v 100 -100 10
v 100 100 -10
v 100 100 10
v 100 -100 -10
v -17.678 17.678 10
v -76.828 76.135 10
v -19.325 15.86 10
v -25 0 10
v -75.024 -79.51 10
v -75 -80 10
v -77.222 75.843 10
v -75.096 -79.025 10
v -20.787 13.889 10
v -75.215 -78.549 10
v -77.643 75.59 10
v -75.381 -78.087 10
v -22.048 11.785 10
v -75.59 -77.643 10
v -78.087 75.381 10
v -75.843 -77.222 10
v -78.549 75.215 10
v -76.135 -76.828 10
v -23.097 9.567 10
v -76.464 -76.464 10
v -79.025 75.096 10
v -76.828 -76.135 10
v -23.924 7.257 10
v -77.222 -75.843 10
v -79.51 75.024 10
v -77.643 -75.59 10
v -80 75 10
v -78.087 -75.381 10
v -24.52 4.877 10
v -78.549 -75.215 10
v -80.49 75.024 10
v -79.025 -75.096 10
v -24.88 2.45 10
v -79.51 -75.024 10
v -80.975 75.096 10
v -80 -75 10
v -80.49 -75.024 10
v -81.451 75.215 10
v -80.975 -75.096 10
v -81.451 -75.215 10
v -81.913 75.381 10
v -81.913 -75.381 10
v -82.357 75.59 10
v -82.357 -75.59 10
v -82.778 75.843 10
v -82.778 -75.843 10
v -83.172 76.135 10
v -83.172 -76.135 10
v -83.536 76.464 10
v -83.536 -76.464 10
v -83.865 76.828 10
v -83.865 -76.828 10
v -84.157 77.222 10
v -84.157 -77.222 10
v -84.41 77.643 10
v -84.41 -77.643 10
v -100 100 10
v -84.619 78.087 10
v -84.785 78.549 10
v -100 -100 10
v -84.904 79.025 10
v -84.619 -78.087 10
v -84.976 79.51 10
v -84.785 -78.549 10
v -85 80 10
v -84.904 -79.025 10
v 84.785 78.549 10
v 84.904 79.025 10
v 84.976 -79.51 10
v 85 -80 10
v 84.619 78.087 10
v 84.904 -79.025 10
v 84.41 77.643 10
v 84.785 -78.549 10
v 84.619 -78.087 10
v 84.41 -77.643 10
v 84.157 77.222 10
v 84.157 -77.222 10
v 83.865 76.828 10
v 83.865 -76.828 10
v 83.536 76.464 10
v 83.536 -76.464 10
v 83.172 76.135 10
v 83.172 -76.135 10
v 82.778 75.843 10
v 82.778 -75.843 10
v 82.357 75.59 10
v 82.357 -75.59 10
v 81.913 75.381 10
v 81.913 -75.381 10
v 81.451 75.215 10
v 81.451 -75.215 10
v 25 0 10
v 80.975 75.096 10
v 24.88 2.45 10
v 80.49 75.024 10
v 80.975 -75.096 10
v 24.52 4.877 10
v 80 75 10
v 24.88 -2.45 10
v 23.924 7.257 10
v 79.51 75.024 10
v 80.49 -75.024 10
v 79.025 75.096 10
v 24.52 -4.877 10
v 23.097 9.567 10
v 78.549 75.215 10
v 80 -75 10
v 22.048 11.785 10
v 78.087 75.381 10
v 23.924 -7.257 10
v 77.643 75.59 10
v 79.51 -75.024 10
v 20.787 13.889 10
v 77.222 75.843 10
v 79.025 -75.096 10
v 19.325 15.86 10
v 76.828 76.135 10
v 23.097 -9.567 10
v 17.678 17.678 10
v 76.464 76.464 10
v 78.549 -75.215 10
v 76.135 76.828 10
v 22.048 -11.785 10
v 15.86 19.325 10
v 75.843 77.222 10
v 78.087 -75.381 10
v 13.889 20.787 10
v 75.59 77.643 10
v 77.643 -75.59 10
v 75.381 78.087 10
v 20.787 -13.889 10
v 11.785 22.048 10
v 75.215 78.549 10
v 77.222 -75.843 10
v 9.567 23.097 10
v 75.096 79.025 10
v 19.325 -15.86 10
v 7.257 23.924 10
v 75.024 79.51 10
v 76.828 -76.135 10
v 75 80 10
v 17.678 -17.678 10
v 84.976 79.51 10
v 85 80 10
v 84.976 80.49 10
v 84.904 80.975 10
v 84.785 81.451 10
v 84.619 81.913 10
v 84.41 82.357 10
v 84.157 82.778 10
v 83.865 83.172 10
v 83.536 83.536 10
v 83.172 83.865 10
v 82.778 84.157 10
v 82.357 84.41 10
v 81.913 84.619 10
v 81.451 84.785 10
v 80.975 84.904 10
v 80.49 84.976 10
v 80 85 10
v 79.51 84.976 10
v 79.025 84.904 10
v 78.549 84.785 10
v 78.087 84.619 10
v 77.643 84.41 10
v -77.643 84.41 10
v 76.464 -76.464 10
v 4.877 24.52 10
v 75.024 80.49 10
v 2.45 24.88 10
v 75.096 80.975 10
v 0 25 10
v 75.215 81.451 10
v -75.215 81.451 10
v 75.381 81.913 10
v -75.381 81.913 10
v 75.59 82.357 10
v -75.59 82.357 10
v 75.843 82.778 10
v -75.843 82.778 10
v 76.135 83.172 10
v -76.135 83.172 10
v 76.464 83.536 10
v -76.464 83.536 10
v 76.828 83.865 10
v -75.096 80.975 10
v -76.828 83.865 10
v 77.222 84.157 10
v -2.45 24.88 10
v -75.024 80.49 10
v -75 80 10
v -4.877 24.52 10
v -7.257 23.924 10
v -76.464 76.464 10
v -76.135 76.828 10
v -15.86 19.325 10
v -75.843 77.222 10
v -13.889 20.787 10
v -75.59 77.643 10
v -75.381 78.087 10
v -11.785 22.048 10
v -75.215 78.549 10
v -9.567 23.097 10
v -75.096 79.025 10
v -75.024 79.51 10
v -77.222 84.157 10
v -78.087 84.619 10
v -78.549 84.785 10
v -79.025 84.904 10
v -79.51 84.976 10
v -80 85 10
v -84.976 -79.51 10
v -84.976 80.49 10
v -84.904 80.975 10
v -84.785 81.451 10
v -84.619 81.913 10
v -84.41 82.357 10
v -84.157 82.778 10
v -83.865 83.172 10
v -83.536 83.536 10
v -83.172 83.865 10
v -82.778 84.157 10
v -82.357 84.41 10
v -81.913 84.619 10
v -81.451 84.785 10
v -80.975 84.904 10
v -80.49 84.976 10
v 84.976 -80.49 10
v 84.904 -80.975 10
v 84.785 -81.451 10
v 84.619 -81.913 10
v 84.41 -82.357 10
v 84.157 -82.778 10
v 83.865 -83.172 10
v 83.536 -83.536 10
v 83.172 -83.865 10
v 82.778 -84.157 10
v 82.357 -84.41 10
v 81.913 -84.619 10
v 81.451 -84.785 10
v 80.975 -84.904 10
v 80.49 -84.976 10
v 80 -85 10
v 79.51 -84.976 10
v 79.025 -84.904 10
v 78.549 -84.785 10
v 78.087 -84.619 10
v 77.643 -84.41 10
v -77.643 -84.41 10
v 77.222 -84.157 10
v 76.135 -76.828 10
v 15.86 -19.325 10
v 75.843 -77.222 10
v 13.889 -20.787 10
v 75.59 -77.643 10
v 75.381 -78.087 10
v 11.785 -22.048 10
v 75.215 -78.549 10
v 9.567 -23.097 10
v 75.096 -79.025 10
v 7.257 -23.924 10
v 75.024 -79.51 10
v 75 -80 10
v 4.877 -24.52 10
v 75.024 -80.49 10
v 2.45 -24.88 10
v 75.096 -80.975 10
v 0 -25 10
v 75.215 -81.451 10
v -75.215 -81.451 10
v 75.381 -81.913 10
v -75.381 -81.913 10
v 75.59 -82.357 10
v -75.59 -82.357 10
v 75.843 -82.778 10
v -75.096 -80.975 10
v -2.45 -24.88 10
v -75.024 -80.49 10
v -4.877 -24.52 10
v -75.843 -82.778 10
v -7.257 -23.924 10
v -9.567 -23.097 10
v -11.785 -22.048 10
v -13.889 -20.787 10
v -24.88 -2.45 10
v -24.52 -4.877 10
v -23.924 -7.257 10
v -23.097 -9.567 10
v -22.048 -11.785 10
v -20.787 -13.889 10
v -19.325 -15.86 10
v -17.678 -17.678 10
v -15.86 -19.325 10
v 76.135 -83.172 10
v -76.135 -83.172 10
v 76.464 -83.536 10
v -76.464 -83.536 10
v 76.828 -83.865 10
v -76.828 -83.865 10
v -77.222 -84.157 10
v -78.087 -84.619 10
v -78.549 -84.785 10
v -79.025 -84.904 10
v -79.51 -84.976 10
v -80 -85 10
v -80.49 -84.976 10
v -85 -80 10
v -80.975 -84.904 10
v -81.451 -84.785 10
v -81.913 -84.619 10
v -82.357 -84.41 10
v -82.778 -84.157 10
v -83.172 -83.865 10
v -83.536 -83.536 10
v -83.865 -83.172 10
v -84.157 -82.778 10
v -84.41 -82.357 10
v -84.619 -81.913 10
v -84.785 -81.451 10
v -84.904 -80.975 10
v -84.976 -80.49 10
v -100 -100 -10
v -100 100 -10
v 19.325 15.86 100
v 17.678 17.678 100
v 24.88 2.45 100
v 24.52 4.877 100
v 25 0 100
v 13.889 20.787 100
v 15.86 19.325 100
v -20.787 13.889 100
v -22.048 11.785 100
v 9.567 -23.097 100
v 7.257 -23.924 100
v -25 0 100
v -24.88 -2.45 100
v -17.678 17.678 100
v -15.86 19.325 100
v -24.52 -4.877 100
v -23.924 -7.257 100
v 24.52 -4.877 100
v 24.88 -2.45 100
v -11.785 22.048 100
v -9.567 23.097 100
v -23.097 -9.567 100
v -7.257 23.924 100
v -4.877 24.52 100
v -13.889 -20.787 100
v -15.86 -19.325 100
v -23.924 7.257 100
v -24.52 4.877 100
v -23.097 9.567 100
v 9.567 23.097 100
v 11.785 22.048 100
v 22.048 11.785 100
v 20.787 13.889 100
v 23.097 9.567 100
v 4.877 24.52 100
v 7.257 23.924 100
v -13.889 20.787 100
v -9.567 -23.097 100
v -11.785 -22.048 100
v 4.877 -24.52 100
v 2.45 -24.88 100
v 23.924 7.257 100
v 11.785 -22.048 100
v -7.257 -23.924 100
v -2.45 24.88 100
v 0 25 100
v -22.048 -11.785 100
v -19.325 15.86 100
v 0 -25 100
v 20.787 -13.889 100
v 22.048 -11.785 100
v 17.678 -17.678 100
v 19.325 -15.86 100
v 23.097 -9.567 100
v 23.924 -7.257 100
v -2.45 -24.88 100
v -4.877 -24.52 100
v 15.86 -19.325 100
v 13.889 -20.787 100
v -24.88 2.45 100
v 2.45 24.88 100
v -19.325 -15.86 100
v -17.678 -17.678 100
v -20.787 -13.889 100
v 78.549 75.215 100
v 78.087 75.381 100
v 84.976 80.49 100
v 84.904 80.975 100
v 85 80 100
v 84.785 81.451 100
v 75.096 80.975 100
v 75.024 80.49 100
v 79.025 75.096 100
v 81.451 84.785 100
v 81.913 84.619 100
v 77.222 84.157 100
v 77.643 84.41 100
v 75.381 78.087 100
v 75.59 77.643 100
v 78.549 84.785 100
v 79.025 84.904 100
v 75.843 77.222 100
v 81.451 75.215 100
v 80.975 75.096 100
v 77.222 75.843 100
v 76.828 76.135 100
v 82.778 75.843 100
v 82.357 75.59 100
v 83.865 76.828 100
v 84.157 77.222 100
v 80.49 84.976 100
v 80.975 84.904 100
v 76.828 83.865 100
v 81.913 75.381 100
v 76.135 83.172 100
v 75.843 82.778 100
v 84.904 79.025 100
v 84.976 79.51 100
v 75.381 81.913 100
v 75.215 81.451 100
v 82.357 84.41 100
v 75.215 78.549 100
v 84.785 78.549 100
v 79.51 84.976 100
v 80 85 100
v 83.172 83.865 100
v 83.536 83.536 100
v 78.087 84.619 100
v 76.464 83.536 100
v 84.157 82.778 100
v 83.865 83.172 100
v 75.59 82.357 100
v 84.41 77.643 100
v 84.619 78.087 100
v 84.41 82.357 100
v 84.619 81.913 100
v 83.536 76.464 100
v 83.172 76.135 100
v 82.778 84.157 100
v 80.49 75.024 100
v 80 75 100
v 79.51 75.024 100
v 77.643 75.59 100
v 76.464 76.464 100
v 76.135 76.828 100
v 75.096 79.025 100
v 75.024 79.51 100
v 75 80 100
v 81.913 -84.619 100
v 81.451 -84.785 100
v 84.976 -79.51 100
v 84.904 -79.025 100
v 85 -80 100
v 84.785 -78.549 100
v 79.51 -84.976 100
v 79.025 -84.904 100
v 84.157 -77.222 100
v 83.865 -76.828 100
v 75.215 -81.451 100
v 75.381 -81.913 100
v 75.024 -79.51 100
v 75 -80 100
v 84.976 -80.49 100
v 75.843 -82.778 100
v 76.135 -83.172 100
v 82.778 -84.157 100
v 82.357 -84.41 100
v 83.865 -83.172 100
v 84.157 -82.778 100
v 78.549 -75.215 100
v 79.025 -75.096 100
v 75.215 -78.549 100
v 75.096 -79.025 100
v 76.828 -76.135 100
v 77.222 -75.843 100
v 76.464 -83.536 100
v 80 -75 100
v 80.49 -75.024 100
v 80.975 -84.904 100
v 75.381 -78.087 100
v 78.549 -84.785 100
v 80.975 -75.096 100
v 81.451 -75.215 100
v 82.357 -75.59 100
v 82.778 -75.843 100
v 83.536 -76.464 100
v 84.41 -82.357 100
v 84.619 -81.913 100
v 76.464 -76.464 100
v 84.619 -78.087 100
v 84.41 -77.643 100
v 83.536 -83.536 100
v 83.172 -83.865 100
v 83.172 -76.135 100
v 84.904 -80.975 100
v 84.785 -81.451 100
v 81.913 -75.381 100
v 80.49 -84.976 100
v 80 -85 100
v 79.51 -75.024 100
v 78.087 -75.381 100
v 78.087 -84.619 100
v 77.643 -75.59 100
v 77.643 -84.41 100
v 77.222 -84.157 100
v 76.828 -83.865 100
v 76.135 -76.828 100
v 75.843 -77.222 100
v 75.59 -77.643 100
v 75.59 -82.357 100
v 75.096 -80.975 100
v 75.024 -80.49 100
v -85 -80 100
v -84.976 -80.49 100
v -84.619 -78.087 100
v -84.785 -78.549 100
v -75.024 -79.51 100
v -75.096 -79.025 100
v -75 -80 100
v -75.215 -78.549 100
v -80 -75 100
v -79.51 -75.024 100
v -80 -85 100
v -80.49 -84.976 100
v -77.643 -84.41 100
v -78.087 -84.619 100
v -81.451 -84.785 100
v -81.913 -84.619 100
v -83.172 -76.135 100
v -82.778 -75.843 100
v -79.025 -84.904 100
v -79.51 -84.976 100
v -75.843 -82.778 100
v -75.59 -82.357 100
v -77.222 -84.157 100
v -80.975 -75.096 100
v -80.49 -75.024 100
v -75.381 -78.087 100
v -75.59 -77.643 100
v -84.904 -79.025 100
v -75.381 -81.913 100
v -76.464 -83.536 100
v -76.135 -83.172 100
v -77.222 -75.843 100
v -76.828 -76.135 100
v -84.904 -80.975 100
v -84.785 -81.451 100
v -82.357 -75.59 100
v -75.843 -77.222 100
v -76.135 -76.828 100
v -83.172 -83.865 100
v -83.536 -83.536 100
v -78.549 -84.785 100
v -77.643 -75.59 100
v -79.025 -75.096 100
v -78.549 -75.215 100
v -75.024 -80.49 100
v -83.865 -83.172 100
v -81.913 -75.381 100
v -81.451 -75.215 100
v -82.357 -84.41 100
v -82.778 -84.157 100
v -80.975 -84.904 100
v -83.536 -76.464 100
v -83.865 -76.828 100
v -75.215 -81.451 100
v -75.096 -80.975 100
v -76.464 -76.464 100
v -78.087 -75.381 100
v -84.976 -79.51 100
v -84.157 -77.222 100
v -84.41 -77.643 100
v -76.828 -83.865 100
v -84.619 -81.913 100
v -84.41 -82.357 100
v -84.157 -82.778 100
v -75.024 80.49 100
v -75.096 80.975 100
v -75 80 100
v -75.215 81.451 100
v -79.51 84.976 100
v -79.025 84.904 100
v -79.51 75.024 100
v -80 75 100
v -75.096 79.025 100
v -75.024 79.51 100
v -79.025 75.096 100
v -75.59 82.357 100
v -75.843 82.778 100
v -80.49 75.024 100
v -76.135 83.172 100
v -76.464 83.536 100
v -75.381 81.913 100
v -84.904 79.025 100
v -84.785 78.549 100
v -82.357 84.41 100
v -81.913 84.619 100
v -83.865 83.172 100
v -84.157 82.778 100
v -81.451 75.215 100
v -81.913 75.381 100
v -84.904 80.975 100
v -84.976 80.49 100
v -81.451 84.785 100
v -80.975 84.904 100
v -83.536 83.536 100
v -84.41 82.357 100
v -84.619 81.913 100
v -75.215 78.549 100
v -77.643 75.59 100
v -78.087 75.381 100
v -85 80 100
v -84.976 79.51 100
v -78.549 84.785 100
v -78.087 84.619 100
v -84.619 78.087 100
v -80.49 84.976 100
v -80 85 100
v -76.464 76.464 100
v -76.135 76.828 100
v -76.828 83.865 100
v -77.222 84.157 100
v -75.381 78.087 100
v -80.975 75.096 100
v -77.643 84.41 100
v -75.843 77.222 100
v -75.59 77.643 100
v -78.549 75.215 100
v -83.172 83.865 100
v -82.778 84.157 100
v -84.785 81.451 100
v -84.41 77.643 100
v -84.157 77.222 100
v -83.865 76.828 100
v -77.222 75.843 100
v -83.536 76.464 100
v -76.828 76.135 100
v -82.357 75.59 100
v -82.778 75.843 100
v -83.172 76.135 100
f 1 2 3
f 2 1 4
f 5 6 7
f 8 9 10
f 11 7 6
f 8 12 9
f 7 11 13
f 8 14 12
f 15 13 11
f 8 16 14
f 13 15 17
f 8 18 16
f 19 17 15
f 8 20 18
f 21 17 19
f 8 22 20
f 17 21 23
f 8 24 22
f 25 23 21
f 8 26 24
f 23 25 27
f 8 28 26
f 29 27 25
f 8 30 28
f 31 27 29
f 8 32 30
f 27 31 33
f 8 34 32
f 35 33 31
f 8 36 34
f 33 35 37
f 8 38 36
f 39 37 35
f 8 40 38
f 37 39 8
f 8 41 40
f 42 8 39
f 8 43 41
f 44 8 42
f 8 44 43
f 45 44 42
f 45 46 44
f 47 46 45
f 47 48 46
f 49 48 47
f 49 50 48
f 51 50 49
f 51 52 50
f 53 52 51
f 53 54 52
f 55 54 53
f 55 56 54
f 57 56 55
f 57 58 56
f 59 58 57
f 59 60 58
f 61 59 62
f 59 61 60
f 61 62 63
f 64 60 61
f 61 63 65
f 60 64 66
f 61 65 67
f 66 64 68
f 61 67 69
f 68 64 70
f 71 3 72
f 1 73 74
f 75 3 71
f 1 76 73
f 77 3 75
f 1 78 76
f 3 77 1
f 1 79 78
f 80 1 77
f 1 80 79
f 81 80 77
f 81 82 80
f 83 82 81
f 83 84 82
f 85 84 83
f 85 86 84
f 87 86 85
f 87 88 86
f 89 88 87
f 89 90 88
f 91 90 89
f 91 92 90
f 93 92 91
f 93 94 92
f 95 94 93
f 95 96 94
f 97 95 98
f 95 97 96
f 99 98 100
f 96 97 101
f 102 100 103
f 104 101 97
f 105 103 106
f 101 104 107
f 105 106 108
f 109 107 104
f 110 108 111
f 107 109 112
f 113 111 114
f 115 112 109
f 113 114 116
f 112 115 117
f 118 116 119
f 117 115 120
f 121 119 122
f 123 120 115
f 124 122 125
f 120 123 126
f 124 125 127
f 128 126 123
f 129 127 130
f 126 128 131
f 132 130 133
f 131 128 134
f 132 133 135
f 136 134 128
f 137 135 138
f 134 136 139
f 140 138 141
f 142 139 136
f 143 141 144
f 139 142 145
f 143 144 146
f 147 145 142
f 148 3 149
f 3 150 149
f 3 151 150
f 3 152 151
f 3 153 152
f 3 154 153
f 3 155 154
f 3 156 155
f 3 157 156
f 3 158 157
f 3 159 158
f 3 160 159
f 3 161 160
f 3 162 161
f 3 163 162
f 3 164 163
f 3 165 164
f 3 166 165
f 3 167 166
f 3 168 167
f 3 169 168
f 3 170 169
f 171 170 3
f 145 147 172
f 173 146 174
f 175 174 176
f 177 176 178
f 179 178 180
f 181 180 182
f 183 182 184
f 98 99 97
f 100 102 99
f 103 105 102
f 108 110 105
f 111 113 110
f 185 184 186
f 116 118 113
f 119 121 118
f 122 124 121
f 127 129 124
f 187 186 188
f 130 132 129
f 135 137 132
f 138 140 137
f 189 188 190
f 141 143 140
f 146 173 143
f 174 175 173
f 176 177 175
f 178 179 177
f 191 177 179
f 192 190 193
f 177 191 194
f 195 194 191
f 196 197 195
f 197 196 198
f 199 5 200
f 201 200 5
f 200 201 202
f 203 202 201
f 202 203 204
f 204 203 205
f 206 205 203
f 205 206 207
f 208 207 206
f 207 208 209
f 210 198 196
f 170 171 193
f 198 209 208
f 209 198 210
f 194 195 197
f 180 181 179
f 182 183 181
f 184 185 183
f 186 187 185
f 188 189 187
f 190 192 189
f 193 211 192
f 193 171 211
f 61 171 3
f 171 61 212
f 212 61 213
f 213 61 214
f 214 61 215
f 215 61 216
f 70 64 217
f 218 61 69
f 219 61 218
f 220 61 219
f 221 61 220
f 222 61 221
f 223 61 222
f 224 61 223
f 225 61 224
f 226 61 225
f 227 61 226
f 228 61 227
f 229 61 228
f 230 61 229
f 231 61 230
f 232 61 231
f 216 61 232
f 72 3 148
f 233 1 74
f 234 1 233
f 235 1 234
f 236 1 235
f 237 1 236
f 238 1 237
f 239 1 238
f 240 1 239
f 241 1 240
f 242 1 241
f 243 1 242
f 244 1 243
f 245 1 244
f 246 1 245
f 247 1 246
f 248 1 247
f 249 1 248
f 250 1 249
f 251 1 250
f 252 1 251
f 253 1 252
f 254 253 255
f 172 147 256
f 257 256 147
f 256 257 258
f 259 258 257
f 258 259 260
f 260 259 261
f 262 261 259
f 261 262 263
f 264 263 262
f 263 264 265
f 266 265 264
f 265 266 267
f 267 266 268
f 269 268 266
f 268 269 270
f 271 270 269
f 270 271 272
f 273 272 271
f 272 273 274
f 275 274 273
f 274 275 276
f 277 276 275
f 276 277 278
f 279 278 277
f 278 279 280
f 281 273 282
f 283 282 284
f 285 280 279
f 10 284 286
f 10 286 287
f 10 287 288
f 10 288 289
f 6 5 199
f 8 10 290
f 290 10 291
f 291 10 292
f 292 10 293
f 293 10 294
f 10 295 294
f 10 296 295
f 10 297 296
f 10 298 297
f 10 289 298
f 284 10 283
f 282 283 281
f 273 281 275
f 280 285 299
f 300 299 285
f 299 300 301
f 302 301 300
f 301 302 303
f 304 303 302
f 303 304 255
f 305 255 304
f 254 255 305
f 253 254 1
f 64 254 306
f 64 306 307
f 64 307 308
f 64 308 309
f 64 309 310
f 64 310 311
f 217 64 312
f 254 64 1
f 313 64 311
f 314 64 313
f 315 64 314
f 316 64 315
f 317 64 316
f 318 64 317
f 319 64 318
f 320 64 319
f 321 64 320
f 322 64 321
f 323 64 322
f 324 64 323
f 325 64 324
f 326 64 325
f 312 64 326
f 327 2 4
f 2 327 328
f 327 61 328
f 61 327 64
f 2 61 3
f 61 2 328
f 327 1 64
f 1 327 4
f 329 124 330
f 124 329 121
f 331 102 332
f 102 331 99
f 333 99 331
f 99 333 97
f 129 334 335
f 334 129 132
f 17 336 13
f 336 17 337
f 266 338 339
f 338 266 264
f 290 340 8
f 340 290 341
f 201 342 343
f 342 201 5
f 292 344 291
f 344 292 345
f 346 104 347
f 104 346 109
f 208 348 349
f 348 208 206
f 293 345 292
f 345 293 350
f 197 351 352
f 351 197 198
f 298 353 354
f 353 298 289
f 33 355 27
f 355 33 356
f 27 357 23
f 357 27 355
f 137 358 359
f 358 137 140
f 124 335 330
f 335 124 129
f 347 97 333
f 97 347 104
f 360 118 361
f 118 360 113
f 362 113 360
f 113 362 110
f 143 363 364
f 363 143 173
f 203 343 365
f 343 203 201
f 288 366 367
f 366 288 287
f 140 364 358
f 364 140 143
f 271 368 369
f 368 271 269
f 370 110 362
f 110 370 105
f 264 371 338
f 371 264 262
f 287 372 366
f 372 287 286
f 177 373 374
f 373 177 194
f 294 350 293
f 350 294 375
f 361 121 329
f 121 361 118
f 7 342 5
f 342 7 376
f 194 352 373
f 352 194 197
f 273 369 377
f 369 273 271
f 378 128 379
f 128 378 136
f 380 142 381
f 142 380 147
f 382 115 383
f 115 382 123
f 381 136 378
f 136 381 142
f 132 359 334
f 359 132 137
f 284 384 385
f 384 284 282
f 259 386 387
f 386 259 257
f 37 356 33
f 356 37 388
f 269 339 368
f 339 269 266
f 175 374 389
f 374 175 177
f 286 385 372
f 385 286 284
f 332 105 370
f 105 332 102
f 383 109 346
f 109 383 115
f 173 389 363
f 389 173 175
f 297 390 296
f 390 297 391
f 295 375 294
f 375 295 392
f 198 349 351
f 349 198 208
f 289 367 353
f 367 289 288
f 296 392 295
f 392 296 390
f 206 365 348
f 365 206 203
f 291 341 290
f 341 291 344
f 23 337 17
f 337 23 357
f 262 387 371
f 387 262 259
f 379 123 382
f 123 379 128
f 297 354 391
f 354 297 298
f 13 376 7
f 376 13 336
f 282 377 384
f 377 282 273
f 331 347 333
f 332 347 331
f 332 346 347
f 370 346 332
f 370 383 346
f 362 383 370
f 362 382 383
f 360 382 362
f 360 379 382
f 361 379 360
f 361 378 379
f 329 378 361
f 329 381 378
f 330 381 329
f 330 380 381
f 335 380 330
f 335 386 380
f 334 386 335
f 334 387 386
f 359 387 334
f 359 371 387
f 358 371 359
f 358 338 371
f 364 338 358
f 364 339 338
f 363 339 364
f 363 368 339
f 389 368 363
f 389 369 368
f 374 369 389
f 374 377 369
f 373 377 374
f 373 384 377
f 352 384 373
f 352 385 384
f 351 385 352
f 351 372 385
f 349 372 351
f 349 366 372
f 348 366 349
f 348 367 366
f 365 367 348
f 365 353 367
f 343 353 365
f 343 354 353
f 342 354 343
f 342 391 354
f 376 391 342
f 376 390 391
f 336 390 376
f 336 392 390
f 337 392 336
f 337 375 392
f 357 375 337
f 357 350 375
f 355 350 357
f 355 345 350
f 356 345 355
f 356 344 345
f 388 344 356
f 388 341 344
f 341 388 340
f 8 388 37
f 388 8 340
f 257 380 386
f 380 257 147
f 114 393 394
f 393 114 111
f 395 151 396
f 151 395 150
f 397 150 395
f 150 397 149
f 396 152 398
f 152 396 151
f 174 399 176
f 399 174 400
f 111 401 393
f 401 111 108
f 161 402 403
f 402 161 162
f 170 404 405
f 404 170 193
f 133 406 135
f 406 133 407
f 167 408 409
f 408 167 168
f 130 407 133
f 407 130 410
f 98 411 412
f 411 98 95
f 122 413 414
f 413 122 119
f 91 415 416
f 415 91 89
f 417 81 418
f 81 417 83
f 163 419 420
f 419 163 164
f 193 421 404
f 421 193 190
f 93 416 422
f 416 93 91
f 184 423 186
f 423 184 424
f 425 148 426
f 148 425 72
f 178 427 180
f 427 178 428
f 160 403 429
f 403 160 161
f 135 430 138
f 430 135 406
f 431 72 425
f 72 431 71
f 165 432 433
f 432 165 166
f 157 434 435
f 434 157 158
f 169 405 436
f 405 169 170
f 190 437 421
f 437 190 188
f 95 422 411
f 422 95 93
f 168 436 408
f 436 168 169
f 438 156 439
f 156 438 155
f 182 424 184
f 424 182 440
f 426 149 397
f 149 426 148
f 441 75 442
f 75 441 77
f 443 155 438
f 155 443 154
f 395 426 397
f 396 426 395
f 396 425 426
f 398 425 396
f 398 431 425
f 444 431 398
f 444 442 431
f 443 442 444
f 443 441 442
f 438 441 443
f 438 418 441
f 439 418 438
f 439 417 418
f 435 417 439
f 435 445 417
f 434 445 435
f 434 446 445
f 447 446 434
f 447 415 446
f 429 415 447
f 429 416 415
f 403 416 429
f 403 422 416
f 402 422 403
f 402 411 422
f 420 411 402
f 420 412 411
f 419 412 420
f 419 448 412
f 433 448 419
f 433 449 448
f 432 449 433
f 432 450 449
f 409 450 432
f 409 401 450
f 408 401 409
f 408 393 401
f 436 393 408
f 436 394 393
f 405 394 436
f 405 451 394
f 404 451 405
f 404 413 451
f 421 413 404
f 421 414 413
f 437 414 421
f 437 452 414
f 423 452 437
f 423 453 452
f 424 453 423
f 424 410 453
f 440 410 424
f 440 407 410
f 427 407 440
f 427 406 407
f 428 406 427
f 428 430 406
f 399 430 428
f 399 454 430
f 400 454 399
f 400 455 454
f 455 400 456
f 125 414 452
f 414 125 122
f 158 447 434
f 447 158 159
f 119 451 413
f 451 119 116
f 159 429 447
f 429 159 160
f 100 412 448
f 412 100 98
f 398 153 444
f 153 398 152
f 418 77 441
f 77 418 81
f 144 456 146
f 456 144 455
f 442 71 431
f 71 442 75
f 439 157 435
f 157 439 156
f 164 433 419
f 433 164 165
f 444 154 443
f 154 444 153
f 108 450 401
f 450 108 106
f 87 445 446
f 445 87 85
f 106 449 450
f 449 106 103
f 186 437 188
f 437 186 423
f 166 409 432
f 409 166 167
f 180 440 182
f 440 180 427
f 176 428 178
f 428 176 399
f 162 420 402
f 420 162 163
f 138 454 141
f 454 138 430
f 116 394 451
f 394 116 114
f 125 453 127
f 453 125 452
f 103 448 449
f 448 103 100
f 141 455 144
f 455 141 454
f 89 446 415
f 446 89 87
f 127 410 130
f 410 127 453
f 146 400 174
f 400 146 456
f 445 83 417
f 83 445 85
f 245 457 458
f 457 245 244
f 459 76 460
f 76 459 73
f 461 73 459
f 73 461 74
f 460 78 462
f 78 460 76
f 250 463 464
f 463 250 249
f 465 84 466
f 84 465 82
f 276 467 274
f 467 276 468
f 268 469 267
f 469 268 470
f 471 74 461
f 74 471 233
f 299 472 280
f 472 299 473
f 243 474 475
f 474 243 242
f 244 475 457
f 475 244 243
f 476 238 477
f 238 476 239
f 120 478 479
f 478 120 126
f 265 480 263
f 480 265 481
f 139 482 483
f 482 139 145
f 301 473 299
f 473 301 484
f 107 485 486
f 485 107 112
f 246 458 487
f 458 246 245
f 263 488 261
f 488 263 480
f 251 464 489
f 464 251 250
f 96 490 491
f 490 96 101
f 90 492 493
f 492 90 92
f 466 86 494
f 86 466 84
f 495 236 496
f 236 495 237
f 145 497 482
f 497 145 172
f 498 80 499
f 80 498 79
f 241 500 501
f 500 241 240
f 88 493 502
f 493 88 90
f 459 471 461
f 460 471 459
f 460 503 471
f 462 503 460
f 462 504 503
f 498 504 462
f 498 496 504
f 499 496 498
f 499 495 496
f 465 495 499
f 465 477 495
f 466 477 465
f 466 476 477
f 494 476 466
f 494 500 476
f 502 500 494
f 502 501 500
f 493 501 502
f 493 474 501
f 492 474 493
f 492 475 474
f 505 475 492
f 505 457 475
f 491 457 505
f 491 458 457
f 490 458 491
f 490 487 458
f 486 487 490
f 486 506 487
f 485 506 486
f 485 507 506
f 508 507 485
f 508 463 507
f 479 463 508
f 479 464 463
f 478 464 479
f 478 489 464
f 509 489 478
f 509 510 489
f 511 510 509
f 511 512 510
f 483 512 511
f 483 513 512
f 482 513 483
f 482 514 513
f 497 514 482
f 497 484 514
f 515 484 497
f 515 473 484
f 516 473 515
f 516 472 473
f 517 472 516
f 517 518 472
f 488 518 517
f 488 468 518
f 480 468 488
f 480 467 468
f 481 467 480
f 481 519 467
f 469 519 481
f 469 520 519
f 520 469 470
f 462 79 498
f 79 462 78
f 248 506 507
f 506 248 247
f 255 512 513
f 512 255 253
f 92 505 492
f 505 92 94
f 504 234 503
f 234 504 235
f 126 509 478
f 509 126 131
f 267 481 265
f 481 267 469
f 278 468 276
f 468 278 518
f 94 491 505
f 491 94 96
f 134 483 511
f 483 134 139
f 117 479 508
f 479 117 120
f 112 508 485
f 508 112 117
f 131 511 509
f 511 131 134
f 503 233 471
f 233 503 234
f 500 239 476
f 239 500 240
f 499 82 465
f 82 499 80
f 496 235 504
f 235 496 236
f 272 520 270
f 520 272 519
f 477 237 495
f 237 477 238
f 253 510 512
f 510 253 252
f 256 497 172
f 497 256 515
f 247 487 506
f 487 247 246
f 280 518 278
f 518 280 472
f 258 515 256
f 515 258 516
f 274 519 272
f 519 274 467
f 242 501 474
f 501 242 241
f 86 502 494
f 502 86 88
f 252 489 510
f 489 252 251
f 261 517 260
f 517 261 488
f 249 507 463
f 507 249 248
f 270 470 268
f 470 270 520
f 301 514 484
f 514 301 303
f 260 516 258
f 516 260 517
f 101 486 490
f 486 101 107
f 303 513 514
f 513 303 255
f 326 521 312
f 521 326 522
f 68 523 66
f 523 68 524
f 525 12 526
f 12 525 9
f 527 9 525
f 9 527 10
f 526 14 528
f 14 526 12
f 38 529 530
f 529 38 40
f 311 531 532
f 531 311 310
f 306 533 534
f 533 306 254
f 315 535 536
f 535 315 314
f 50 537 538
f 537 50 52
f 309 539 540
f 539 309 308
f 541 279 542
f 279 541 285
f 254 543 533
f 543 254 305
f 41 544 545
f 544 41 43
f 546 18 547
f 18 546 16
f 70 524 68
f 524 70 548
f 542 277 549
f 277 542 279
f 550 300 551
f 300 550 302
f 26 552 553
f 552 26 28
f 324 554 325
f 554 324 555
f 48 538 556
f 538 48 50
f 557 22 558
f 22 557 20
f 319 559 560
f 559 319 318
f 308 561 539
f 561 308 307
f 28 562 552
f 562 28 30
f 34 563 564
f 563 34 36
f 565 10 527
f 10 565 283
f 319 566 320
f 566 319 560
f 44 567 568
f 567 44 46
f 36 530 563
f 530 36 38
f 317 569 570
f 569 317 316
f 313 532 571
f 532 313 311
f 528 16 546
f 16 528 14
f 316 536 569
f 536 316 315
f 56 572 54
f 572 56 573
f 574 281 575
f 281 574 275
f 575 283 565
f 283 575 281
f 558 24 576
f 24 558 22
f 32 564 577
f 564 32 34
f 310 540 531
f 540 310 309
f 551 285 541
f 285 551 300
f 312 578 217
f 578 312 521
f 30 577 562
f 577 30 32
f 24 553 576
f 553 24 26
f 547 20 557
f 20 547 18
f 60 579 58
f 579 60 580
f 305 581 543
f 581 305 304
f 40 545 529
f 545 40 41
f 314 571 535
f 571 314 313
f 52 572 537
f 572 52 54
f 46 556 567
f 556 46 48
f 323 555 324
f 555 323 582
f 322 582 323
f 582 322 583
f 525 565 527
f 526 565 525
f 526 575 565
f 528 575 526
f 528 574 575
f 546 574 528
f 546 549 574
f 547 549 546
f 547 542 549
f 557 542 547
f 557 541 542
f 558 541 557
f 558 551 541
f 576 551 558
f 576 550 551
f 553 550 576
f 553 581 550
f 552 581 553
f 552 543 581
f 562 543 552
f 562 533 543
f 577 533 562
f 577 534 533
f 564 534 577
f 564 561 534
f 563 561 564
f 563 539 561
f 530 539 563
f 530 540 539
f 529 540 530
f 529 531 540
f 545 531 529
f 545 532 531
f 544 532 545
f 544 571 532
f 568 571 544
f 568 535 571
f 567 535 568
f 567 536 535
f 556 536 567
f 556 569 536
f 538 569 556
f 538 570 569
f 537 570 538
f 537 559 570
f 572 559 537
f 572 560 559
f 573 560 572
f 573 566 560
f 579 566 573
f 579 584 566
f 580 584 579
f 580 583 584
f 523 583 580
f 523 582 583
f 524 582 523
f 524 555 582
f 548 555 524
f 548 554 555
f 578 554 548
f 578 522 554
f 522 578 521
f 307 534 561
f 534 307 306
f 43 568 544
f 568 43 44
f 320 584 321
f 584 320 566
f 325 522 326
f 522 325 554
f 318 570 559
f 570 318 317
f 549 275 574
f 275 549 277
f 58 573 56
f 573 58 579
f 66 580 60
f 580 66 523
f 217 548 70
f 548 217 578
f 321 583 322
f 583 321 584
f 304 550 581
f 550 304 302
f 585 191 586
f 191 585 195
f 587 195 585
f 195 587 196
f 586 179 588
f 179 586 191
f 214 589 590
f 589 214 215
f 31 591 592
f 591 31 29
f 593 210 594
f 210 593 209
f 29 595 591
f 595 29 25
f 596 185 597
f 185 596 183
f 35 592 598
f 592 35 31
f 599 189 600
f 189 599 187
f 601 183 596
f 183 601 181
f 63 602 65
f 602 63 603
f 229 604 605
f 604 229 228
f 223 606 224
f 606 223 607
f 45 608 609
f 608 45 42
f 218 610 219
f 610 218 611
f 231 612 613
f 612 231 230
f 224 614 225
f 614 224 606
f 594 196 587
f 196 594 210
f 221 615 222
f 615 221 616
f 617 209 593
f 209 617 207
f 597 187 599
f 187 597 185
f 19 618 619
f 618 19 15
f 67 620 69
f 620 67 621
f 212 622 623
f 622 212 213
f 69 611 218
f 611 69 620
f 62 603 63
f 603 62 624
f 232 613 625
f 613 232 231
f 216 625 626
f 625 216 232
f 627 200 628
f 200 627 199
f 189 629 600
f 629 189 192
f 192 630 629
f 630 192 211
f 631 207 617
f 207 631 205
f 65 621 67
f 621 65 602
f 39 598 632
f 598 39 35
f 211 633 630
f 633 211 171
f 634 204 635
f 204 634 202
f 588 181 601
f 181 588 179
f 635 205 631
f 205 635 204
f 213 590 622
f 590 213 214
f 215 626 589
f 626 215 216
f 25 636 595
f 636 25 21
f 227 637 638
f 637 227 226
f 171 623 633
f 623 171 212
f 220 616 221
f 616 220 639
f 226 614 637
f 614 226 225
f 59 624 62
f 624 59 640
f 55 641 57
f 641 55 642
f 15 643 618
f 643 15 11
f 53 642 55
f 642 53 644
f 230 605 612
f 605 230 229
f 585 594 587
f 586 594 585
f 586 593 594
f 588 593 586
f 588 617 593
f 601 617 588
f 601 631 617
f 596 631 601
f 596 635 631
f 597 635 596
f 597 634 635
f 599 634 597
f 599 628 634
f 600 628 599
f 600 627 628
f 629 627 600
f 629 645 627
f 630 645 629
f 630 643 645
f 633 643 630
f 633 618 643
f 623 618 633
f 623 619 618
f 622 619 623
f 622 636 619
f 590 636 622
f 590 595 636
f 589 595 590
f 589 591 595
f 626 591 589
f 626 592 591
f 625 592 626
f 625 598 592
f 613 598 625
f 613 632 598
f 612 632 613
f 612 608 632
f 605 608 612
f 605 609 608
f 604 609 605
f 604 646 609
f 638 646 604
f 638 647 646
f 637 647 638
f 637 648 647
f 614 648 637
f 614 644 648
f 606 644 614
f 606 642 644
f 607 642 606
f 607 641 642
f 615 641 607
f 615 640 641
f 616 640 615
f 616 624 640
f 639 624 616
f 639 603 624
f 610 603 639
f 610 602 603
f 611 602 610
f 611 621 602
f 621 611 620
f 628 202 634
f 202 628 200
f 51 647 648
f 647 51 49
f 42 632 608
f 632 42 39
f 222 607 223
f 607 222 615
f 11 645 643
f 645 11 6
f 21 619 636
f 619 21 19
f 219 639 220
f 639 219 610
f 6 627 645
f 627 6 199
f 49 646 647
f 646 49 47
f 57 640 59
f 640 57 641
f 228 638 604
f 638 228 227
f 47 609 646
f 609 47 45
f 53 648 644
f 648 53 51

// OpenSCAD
union(){cube(size=[200.0000,200.0000,20.0000],center=true);cylinder(h=100.0000,d=50.0000,$fn=64);translate([80.0,80.0,0.0]){cylinder(h=100.0000,d=10.0000,$fn=64);}translate([80.0,-80.0,0.0]){cylinder(h=100.0000,d=10.0000,$fn=64);}translate([-80.0,-80.0,0.0]){cylinder(h=100.0000,d=10.0000,$fn=64);}translate([-80.0,80.0,0.0]){cylinder(h=100.0000,d=10.0000,$fn=64);}}
